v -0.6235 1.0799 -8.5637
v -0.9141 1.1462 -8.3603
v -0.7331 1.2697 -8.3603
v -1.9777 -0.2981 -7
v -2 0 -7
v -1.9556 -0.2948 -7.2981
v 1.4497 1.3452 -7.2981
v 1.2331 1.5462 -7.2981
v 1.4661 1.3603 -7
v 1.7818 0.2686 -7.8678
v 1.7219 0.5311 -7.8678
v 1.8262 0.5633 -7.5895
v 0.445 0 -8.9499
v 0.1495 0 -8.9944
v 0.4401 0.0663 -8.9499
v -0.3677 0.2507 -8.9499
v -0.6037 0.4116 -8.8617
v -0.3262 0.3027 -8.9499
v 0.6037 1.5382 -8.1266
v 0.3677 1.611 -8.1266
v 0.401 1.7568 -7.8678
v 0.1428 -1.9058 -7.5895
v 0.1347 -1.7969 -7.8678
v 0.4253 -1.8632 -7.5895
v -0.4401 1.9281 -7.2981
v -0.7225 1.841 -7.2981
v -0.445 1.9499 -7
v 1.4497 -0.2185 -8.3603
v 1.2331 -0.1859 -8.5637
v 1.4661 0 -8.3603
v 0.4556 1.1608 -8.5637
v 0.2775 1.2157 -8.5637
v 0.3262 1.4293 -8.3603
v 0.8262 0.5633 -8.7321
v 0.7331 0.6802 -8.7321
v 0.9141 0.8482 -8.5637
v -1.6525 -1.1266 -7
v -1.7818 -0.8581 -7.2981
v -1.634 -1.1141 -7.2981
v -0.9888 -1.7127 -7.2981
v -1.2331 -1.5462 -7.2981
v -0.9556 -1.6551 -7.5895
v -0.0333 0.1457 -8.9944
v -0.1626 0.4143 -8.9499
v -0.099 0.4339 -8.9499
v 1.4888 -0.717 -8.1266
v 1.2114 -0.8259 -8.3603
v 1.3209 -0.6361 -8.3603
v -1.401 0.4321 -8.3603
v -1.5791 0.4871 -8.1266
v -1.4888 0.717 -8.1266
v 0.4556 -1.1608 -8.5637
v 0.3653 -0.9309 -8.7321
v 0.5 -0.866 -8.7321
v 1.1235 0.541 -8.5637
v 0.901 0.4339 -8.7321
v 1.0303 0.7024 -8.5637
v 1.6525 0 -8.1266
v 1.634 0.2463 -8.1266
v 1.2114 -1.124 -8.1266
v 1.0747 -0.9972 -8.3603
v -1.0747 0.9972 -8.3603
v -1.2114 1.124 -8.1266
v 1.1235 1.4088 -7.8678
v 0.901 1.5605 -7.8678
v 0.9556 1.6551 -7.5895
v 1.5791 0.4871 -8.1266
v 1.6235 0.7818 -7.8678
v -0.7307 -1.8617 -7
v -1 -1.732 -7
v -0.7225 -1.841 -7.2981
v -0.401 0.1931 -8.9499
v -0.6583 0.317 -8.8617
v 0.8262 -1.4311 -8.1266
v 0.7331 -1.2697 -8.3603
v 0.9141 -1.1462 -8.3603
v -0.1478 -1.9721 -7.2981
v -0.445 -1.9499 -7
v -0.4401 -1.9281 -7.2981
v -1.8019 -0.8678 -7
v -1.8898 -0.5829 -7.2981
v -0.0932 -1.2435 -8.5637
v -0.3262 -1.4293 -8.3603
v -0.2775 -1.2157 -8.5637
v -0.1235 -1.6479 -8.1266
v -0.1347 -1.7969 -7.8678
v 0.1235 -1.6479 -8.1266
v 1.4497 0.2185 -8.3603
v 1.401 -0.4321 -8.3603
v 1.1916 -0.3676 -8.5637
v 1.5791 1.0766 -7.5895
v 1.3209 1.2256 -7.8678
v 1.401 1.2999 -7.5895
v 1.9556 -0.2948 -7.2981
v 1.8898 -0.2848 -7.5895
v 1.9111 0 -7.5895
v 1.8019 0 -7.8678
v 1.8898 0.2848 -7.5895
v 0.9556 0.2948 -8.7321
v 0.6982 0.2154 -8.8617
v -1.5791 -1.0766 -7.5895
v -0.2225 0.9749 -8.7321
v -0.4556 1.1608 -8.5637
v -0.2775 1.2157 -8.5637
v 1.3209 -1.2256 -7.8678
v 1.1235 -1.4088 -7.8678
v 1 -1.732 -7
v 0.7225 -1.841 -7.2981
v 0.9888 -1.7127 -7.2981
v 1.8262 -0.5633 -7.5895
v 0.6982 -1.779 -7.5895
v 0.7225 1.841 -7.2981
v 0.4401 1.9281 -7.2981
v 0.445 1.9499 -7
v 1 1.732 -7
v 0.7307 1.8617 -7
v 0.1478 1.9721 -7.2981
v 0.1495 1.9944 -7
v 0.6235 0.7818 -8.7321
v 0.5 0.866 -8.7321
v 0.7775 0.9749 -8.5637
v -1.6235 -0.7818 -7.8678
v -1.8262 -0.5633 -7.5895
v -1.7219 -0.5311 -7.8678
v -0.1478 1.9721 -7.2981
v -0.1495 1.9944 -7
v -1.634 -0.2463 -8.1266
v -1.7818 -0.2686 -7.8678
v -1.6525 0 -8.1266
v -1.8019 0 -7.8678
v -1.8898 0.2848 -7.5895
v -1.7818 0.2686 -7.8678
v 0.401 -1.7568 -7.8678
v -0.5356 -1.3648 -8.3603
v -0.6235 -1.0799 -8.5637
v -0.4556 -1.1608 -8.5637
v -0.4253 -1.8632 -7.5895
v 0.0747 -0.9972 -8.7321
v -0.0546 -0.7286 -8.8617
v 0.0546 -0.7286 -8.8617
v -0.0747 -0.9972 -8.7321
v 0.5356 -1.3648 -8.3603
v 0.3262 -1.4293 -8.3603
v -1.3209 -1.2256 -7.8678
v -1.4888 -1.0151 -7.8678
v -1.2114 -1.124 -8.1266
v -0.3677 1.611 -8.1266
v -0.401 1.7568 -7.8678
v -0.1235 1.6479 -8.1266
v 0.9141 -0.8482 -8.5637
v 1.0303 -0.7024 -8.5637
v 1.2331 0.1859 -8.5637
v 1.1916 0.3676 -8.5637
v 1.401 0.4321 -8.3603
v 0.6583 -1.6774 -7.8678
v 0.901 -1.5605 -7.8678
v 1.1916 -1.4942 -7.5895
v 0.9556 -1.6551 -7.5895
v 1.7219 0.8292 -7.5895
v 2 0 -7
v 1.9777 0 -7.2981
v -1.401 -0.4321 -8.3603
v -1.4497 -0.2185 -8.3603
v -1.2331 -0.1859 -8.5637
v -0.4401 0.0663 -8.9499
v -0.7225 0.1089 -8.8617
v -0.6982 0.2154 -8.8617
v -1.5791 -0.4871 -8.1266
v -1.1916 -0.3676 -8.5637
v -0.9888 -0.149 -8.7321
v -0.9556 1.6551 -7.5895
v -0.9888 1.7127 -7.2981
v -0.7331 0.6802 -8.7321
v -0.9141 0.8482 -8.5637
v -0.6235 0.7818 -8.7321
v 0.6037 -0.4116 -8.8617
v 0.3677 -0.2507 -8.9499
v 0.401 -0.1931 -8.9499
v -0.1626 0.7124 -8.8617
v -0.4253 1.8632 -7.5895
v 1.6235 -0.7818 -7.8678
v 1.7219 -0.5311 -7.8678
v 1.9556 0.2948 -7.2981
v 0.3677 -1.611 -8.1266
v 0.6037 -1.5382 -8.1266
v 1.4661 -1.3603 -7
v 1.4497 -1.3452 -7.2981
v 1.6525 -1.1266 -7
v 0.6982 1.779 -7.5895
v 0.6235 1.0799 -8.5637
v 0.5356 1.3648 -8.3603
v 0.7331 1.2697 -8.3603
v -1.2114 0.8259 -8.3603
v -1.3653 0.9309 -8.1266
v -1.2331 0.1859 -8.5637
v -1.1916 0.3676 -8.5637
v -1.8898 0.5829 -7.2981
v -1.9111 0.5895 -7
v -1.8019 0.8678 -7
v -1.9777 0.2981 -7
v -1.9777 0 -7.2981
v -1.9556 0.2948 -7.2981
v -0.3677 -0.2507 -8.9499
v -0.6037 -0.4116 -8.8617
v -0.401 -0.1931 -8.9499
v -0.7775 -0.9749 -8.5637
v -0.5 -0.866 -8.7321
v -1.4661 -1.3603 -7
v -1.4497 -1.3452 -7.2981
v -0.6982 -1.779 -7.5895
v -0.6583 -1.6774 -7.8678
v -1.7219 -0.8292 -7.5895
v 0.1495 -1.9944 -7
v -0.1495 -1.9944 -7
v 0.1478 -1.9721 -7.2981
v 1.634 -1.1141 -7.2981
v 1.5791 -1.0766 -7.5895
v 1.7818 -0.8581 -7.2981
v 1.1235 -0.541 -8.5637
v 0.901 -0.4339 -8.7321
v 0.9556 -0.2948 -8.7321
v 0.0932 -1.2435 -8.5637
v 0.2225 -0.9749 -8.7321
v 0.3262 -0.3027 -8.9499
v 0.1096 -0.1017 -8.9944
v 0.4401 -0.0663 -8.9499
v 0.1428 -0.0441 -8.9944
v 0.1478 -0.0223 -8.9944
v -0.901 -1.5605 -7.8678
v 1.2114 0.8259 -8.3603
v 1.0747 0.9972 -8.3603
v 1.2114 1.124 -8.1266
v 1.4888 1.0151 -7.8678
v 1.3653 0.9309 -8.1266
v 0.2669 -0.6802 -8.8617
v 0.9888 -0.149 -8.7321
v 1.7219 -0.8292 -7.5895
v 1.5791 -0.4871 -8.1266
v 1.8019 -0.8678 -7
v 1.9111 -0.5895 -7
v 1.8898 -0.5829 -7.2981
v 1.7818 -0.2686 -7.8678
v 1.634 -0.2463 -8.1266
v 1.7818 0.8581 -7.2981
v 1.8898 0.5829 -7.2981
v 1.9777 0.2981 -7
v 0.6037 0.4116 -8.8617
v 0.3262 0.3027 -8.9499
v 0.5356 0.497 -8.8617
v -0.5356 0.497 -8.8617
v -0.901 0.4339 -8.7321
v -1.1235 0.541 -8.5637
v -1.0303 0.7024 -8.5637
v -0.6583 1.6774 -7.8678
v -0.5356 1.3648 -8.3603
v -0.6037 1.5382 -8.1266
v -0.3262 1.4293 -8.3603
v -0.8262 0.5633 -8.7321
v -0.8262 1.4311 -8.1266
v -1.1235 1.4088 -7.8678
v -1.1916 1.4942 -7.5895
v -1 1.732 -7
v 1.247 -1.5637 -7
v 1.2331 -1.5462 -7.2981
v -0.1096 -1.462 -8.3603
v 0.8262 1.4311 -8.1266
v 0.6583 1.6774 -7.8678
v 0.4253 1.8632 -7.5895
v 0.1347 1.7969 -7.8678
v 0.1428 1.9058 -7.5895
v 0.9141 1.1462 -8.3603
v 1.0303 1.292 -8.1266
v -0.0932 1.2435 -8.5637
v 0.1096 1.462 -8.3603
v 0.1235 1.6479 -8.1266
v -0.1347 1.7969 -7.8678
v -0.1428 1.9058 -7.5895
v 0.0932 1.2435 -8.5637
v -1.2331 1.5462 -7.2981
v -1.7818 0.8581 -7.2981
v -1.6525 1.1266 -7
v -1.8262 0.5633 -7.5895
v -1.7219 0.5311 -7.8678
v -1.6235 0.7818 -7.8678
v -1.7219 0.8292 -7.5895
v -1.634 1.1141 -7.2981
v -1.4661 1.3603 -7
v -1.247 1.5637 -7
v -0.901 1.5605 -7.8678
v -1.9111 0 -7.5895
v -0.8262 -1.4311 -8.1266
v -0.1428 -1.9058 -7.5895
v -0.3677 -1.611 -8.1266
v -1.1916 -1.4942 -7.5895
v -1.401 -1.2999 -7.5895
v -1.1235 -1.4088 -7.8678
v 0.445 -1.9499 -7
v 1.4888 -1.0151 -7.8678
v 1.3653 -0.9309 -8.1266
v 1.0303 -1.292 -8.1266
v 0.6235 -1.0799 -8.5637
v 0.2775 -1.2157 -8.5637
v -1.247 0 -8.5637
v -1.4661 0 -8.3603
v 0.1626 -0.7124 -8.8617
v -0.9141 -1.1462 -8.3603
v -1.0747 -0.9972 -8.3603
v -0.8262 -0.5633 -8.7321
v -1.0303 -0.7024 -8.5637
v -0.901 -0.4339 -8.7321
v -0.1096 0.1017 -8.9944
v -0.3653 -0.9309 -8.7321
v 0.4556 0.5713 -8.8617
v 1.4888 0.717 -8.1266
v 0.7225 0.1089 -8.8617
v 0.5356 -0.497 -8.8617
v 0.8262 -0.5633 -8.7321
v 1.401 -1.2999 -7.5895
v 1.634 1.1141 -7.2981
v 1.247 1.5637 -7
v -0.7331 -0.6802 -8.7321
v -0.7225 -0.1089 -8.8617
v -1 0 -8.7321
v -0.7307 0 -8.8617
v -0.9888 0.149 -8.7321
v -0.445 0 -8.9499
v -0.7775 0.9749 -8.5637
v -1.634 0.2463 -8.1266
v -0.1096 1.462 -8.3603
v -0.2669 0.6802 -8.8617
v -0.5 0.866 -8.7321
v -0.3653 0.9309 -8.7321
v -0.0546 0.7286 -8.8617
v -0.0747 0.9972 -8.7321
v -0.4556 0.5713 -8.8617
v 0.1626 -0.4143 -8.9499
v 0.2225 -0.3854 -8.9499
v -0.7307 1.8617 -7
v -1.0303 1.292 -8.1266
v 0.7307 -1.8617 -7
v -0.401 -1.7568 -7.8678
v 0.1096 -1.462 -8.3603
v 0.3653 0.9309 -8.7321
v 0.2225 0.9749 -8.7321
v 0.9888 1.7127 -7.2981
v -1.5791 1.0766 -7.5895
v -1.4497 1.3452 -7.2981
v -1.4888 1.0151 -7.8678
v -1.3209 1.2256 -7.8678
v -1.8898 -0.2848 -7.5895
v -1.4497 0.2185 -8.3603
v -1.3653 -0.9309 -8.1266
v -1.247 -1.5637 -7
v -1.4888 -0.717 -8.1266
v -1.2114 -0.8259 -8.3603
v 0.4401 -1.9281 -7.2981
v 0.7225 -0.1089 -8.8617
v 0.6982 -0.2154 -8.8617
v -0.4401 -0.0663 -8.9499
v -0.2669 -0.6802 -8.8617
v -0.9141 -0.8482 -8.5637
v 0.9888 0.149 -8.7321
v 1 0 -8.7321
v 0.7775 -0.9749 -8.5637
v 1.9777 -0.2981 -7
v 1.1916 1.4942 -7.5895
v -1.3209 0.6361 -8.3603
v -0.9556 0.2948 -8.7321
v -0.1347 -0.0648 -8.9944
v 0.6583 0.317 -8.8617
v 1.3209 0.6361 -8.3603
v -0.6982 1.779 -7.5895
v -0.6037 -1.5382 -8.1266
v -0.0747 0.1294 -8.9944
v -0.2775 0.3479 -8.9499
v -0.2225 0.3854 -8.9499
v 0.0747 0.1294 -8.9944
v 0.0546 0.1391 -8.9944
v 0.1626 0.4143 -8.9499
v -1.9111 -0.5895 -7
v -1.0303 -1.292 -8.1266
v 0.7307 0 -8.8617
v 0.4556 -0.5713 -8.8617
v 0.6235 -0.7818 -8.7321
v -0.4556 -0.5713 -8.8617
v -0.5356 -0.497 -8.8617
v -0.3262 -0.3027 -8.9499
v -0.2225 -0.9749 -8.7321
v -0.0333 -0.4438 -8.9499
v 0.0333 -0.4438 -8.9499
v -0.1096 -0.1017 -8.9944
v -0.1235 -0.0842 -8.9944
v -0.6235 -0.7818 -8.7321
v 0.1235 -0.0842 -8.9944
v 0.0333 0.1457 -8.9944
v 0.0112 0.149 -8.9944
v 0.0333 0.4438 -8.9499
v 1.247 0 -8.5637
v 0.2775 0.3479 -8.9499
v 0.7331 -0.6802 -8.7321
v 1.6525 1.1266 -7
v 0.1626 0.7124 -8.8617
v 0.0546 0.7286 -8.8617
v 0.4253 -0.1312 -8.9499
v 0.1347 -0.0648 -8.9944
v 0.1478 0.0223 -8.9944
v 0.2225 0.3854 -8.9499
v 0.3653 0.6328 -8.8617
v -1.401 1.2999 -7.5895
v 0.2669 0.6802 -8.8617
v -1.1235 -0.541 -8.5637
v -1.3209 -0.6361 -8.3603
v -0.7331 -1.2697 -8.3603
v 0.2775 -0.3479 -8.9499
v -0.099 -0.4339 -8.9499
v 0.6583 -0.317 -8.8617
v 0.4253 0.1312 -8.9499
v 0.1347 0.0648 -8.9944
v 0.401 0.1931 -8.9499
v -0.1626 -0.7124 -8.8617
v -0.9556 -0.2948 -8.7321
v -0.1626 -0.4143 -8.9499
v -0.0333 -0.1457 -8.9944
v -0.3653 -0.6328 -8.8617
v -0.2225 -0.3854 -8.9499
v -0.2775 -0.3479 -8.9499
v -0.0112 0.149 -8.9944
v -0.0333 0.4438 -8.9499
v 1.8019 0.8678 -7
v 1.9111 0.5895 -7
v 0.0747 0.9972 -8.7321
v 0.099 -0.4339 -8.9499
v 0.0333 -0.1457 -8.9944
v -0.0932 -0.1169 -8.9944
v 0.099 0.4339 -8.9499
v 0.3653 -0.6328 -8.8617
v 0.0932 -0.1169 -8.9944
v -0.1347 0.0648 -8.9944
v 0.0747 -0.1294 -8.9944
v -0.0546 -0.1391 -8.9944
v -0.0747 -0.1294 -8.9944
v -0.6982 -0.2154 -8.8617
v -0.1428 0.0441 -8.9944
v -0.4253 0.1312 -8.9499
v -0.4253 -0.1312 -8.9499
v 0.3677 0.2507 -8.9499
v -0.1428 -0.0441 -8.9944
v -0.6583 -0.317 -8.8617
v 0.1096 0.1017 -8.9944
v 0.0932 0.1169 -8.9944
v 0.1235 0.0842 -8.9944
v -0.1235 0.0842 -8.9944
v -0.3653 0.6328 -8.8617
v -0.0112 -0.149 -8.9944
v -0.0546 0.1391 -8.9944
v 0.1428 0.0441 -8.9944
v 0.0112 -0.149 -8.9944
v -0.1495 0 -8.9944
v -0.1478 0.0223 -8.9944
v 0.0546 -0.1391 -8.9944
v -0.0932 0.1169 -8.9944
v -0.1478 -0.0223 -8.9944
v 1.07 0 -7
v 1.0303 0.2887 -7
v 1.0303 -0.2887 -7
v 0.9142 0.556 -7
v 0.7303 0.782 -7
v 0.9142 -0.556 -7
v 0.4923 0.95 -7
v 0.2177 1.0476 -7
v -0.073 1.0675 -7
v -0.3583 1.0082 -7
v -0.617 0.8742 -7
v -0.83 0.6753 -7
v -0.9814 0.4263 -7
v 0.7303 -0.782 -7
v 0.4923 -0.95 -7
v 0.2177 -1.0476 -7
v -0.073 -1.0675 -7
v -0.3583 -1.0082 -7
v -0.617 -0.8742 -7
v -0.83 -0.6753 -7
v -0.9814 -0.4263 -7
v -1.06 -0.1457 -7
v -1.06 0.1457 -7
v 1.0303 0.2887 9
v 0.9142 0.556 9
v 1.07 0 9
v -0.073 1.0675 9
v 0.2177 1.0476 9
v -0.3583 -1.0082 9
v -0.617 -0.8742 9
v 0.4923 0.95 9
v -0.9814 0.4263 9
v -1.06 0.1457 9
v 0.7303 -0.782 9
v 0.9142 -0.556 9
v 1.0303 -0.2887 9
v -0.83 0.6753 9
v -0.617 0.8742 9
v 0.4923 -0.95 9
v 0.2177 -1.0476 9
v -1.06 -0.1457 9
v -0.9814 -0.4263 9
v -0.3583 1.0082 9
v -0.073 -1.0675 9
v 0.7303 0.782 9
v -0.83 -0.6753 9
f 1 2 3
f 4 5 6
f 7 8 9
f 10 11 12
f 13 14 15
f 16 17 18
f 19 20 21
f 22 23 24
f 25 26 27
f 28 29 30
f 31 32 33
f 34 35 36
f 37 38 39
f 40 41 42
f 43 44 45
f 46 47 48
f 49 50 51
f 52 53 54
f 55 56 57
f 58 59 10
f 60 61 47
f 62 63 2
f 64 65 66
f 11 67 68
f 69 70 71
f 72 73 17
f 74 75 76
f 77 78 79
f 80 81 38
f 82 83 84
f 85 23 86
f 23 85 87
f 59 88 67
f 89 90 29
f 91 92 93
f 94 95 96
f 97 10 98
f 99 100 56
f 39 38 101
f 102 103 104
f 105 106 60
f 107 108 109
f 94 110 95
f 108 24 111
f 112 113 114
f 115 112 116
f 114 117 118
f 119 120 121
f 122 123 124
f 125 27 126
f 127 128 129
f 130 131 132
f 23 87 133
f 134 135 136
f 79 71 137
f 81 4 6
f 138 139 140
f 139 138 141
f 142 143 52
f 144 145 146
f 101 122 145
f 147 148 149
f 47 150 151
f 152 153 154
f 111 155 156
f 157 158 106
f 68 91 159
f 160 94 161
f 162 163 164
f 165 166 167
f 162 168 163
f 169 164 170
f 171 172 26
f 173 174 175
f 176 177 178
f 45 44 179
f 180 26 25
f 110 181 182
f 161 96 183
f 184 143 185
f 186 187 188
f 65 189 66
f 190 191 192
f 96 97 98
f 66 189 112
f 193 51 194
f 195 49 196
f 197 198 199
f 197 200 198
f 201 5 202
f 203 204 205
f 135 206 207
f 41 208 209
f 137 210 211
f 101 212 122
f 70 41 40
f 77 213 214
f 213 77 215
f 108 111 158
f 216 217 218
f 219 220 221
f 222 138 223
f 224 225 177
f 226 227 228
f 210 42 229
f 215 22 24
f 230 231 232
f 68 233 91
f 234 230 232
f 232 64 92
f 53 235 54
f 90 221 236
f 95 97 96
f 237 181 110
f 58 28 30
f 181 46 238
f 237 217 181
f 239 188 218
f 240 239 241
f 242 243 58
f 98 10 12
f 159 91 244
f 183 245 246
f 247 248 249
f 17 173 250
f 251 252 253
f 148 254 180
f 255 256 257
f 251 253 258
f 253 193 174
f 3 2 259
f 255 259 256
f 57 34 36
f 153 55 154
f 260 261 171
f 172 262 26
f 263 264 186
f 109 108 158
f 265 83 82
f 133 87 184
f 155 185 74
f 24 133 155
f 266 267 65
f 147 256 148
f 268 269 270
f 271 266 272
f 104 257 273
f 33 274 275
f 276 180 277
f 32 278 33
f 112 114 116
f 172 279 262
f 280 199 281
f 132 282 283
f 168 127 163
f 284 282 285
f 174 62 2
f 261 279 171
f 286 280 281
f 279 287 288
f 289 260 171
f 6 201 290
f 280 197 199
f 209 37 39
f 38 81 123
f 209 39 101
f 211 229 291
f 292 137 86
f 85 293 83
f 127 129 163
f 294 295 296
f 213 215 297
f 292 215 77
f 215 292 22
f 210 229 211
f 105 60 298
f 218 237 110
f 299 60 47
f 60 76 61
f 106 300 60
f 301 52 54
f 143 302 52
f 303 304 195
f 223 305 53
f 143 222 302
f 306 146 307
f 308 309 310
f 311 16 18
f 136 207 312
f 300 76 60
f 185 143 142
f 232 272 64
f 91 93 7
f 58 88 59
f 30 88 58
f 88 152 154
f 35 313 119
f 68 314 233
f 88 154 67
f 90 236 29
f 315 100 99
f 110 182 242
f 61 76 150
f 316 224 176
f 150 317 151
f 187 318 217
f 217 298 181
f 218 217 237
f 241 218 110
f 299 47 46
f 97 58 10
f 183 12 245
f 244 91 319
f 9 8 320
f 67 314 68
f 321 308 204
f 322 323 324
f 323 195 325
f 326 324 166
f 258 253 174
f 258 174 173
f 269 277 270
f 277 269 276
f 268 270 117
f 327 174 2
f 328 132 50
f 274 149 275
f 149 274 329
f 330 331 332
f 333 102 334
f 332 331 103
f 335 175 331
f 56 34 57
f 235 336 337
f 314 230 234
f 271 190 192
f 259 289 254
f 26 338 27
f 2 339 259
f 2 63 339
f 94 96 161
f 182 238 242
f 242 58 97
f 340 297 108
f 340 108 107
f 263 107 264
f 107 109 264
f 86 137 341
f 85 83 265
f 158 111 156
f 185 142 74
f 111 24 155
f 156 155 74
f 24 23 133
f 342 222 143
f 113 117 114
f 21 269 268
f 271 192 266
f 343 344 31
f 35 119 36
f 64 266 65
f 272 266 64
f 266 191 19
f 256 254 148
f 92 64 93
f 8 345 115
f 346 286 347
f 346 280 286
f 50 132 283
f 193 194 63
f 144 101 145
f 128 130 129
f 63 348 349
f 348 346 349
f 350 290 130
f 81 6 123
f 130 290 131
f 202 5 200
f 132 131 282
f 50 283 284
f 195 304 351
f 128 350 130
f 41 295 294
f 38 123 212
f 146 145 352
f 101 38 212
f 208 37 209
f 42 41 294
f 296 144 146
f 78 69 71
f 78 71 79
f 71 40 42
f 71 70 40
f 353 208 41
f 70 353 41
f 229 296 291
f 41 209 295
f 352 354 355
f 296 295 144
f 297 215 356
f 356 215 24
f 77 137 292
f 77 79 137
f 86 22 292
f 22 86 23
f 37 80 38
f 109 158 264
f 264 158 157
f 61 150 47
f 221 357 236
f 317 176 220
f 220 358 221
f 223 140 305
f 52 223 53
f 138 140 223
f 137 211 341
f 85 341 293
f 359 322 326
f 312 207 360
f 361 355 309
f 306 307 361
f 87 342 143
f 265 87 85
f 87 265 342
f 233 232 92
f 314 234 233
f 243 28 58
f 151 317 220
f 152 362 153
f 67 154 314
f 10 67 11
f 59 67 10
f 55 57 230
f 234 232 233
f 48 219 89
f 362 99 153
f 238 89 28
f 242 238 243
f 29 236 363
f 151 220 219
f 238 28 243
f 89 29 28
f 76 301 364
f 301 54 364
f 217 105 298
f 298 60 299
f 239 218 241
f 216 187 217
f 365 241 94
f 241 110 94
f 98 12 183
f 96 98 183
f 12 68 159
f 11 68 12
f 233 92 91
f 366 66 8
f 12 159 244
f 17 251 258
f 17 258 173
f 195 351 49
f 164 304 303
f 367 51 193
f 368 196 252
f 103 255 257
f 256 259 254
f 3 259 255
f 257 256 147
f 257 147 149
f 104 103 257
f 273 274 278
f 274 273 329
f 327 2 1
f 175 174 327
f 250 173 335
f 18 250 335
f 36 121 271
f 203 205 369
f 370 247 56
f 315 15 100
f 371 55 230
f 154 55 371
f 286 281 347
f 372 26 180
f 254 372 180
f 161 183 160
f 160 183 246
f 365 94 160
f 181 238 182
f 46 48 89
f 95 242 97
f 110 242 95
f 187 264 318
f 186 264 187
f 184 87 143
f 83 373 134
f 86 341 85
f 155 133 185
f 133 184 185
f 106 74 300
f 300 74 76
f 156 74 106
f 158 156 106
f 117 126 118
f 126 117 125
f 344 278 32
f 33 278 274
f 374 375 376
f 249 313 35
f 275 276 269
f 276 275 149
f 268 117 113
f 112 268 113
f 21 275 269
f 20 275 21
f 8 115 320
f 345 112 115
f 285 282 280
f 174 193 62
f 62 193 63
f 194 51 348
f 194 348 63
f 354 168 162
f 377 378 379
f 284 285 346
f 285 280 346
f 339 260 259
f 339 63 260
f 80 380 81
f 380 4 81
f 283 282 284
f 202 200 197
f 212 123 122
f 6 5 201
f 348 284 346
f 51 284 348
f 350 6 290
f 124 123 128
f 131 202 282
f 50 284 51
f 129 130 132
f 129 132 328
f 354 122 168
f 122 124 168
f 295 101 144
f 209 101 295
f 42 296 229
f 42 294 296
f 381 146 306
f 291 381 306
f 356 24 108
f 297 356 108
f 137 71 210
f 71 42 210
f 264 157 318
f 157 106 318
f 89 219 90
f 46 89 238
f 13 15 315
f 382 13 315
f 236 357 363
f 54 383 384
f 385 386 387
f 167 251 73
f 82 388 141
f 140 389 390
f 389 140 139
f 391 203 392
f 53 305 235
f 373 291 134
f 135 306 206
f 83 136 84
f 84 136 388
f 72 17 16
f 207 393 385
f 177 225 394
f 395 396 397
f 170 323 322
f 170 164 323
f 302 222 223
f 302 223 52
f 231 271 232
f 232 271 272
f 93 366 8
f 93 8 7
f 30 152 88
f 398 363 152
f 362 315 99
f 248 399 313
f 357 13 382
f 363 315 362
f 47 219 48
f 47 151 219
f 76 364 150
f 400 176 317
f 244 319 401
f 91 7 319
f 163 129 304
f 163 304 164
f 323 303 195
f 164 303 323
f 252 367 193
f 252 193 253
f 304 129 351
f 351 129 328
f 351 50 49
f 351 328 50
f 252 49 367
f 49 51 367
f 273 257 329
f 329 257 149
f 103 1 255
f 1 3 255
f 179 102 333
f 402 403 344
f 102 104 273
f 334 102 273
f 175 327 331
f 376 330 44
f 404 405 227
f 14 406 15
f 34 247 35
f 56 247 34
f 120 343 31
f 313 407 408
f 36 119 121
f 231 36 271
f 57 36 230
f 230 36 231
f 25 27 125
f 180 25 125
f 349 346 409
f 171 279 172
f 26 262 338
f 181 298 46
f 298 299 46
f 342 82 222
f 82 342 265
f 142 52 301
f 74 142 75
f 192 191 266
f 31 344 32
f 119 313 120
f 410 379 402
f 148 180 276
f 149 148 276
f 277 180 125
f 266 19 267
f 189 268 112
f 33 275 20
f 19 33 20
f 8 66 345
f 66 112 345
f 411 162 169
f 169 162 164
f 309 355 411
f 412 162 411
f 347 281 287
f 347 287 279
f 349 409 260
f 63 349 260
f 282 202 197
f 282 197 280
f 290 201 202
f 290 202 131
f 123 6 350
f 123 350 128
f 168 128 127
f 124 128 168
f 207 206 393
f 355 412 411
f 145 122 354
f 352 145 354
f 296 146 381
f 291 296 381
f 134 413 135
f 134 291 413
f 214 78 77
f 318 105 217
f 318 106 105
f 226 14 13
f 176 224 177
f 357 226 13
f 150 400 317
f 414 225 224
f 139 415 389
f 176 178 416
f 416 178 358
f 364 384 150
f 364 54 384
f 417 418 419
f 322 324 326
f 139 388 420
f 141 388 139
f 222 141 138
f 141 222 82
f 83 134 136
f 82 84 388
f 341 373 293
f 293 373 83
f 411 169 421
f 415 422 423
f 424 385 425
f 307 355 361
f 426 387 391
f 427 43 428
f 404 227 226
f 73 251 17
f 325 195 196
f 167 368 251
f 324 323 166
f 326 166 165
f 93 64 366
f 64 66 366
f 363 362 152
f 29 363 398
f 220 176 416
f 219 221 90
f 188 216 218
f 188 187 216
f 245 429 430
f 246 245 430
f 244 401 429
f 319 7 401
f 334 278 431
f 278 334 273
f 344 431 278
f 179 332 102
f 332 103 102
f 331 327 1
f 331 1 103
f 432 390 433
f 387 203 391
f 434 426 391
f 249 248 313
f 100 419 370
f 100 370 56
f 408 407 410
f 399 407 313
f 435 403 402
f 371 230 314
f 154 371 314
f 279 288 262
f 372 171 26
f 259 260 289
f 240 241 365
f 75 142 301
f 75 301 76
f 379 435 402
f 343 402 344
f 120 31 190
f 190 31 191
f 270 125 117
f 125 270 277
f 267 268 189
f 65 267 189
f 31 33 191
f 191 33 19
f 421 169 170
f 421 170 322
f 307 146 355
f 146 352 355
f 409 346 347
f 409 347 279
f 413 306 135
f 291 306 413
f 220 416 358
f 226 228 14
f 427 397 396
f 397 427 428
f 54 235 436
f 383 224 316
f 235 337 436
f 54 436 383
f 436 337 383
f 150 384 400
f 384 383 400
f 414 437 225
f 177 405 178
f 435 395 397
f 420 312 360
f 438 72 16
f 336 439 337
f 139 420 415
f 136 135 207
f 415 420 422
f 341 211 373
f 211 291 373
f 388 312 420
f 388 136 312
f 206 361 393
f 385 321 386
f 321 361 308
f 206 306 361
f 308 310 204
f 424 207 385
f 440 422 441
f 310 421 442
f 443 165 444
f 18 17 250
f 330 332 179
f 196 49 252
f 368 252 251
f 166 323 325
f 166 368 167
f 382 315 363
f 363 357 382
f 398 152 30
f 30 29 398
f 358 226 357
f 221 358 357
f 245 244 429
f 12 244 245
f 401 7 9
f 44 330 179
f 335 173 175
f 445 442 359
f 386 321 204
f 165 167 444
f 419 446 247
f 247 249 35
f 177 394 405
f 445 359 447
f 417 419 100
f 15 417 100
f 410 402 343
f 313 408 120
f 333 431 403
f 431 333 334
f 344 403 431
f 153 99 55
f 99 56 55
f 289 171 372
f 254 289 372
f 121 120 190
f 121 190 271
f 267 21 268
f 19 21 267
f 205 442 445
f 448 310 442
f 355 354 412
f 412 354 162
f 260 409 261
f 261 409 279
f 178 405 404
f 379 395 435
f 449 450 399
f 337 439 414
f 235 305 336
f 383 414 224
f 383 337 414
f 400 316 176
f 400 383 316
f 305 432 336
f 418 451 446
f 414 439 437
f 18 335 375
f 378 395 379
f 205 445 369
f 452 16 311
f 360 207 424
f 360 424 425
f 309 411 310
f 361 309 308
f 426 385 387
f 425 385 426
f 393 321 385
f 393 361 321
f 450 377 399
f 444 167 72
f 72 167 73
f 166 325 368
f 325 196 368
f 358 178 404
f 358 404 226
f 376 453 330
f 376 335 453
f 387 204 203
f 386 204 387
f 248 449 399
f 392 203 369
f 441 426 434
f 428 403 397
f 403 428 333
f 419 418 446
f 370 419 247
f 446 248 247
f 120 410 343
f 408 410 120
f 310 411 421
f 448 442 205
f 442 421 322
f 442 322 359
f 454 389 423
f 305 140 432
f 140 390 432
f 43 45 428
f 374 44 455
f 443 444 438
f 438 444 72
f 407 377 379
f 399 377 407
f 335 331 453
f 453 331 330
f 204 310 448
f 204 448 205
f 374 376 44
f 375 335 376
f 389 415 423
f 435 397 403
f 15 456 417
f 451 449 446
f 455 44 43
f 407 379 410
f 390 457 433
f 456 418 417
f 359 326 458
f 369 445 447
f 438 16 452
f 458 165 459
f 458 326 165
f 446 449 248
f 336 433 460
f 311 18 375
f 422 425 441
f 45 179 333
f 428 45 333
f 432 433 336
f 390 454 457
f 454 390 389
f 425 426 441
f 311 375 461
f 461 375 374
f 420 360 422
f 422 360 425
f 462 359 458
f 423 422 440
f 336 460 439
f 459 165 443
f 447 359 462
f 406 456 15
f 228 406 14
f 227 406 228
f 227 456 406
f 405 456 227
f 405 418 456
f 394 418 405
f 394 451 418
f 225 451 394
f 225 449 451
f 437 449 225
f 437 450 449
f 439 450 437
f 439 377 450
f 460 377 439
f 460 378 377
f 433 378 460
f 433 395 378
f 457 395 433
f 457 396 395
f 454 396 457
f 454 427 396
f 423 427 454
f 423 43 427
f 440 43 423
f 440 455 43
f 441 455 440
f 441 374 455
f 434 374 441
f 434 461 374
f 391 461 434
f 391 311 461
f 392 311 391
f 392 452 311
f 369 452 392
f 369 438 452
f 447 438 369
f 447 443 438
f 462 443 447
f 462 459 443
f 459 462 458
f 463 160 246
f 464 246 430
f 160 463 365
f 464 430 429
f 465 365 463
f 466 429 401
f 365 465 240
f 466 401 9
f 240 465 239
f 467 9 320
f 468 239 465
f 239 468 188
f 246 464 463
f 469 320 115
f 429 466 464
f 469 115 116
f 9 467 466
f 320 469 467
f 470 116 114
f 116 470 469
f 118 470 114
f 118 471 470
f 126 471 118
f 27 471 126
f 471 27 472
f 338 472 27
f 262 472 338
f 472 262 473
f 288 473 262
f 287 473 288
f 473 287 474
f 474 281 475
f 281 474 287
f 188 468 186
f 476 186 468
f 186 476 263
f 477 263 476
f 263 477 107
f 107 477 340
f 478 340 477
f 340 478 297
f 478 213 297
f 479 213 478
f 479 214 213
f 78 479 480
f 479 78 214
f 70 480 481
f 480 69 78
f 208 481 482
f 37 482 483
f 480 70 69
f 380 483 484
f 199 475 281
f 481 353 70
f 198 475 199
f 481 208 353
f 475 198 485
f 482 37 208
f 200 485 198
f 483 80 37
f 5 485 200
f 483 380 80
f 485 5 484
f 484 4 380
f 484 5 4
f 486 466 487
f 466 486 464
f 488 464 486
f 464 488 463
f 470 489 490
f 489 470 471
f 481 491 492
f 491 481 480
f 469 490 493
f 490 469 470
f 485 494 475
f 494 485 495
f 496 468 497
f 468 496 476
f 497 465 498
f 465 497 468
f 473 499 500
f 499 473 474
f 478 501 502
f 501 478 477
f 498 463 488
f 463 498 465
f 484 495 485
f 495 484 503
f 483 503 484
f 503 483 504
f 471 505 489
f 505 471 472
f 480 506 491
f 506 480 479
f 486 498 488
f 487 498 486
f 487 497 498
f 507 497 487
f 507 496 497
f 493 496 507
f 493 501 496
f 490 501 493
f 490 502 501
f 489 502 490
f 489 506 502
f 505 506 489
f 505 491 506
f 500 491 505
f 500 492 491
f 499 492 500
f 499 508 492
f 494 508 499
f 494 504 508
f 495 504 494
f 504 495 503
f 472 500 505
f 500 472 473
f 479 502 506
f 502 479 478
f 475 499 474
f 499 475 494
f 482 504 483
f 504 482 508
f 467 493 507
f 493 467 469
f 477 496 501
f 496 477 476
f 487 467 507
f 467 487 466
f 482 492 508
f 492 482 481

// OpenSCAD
// file: hexagon.scad
// -*-C-*-
// Model of a hexagon.
//
// Copyright 2013, Brian Davis
//
// License: LGPL 2.1 or later

// sine of 60 degrees
SIN_60=0.866025403784439;

// A 3D hexagon with height h and side length s.
//
// NOTE: the default values s=4, h=3 are for an M4 bolt.
//
// See http://www.rdwarf.com/lerickson/hex/
module hexagon(s=4, h=3) {
  A=0.5 * s;
  B=SIN_60 * s;
  C=s;

  translate([-s, -s * SIN_60, -h / 2])
    linear_extrude(height=h)
      polygon([[0, B], [A, 0],
	       [A + C, 0], [2 * C, B],
	       [A + C, 2 * B], [A, 2 * B]],
	      paths=[[0, 1, 2, 3, 4, 5]]);
}

// Test renders.
$fn=0;
$fa=0.01;
$fs=0.9;

hexagon();
// main file
// -*-C-*-
// Module for various types of bolts, screws, nuts, and washers.
//
// NOTE: the various _socket() objects are designed to be
// used with the difference() function to carve out sockets
// in other objects.
//
// Copyright 2013, Brian Davis
//
// License: LGPL 2.1 or later

use <hexagon.scad>

$fn=0;
$fa=0.01;
$fs=0.3;




// Generic support code.

/*
 * NOTE:
 * hs = head side (the length of one side of the hexagonal head)
 * hh = head height (the height/width of the hexagonal head)
 * sr = shaft radius
 * sh = shaft height
 */
module generic_bolt(hs, hh, sr, sh) {
  // Center the model.
  translate([0, 0, -sh / 2])
    union() {
      // head
      hexagon(s=hs, h=hh);
      // shaft
      // NOTE: add extra 0.1 to ensure proper connection
      // between shaft and head.
      translate([0, 0, (hh / 2) - 0.1])
        cylinder(r=sr, h=(sh + 0.1));
    }
}

/*
 * NOTE:
 * hr = head radius
 * hh = head height (the height/width of the hexagonal head)
 * sr = shaft radius
 * sh = shaft height
 * FIXME: philips head slots and some roundedness on the head
 * are not shown.
 */
module generic_machine_screw(hr, hh, sr, sh) {
  // Center the model.
  translate([0, 0, -sh / 2])
    union() {
      // head
      cylinder(r=hr, h=hh);
      // shaft
      // NOTE: add extra 0.1 to ensure proper connection
      // between shaft and head.
      translate([0, 0, (hh / 2) - 0.1])
        cylinder(r=sr, h=(sh + 0.1));
    }
}

/*
 * NOTE:
 * hr = head radius
 * hh = head height (the height/width of the conical head)
 * sr = shaft radius
 * sh = shaft height
 * FIXME: philips head slots and some roundedness on the head
 * are not shown.
 */
module generic_flat_head_machine_screw(hr, hh, sr, sh) {
  // Center the model.
  translate([0, 0, -sh / 2])
    union() {
      // head
    cylinder(r1=hr, r2=sr, h=hh);
      // shaft
      // NOTE: add extra 0.1 to ensure proper connection
      // between shaft and head.
      translate([0, 0, (hh / 2) - 0.1])
        cylinder(r=sr, h=(sh + 0.1));
    }
}

/*
 * NOTE:
 * hs = hexagon side (the length of one side of the outer hexagon)
 * hh = hexagon height
 * ir = inner radius (the radius of the inner hole)
 */
module generic_nut(hs, hh, ir) {
  difference() {
    hexagon(s=hs, h=hh);
    translate([0, 0, -(hh + 0.5) / 2])
      cylinder(r=ir, h=hh+0.5);
  }
}

/*
 * NOTE:
 * ir = inside radius
 * or = outside radius
 * t = thickness
 */
module generic_washer(ir, or, t) {
  difference() {
    cylinder(r=or, h=t, center=true);
    cylinder(r=ir, h=2 * t, center=true);
  }
}

/*
 * NOTE:
 * hr = head radius (the radius of the extra cutout for the head)
 * hh = head height
 * sr = shaft radius
 * sh = shaft height
 */
module generic_loose_socket(hr, hh, sr, sh) {
  // Center the model.
  translate([0, 0, -sh / 2])
    union() {
      // head
      cylinder(r=hr, h=hh, center=true);
      // shaft
      // NOTE: add extra 0.1 to ensure proper connection
      // between shaft and head.
      translate([0, 0, ((sh + hh) / 2) - 0.1])
        cylinder(r=sr, h=(sh + 0.1), center=true);
    };
}




// Fasteners using Metric units.

// M4

/*
 * A hex bolt with 4 mm diameter and variable length shaft with fixed
 * size, hexagonal head 3 mm in width and 4 mm on a side.
 */
module m4bolt(l=20) {
  color("gray")
  generic_bolt(hs=4, hh=3, sr=2, sh=l);
}

/*
 * A nut to fit M4 size bolts/screws.
 */
module m4nut() {
  color("gray")
  generic_nut(hs=4, hh=3, ir=2);
}

/*
 * A washer to fit M4 size bolts/screws.
 */
module m4washer() {
  color("gray")
  generic_washer(ir=2.15, or=6, t=1);
}

/*
 * A socket to tightly fit the head of the M4 size bolt,
 * with variable length.
 */
module m4bolt_socket_tight(l=20, ext=0) {
  generic_bolt(hs=4.25, hh=3.25 + ext, sr=2.25, sh=20);
}

/*
 * A socket to fit the head of the M4 size bolt with room
 * for the bolt to be tightened, with variable length.
 * NOTE:
 * er = the amount of extra radius around the head
 * eh = the amount of extra height for the space around the head
 */
module m4bolt_socket_loose(l=20, er=0, eh=0) {
  generic_loose_socket(hr=6 + er, hh=3.25 + eh, sr=2.2, sh=l);
}

/*
 * A socket to fit the M4 size nut.
 */
module m4nut_socket() {
  hexagon(s=4.25, h=3.25);
}


// M5

/*
 * A hex bolt with 5 mm diameter and variable length shaft with fixed
 * size, hexagonal head 3.6 mm in height/width and 5 mm on a side.
 */
module m5bolt(l=20) {
  color("gray")
  generic_bolt(hs=5, hh=3.6, sr=2.5, sh=l);
}

/*
 * A flat-head machine screw with 5mm diameter and variable length
 * shaft.
 * NOTE: Philips head slots not shown.
 */
module m5flat_head_machine_screw(l=20) {
  color("gray")
  generic_flat_head_machine_screw(hr=4.5, hh=3, sr=2.4, sh=l);
}

/*
 * A nut to fit M5 size bolts/screws.
 */
module m5nut() {
  color("gray")
  generic_nut(hs=5, hh=4, ir=2.5);
}

/*
 * A socket to tightly fit the head of the M5 size bolt,
 * with variable length.
 */
module m5bolt_socket_tight(l=20, ext=0) {
  generic_bolt(hs=5.25, hh=3.85 + ext, sr=2.75, sh=l);
}

/*
 * A socket to fit the head of the M5 size bolt with room
 * for the bolt to be tightened, with variable length.
 * er = the amount of extra radius around the head
 * eh = the amount of extra height for the space around the head
 */
module m5bolt_socket_loose(l=20, er=0, eh=0) {
  generic_loose_socket(hr=7 + er, hh=4.1 + eh, sr=3, sh=l);
}

/*
 * A socket to fit the M5 size nut.
 */
module m5nut_socket() {
  hexagon(s=5.25, h=3.85);
}

/*
 * A lock nut to fit M5 size bolts/screws.
 */
module m5locknut() {
  color("gray")
  union() {
    generic_nut(hs=5, hh=3, ir=2.125);
    translate([0, 0, 2])
      difference() {
        cylinder(r=3.75, h=1, center=true);
        cylinder(r=2.125, h=1.5, center=true);
      }
  }
}


// M6

/*
 * A flat-head machine screw with 6mm diameter and variable length
 * shaft.
 * NOTE: Philips head slots not shown.
 */
module m6flat_head_machine_screw(l=20) {
  color("gray")
  generic_flat_head_machine_screw(hr=5.5, hh=3, sr=2.9, sh=l);
}

/*
 * Standard-sized M6 x 20mm flat-head machine screw.
 * NOTE: the 20mm length includes the head.
 */
module m6x20mm_flat_head_machine_screw() {
  m6flat_head_machine_screw(l=17);
}

/*
 * Standard-sized M6 x 25mm flat-head machine screw.
 * NOTE: the 25mm length includes the head.
 */
module m6x25mm_flat_head_machine_screw() {
  m6flat_head_machine_screw(l=22);
}

/*
 * Standard-sized M6 x 35mm flat-head machine screw.
 * NOTE: the 35mm length includes the head.
 */
module m6x35mm_flat_head_machine_screw() {
  m6flat_head_machine_screw(l=32);
}

/*
 * A hex bolt with 5 mm diameter and variable length shaft with fixed
 * size, hexagonal head 3.6 mm in height/width and 5 mm on a side.
 */
module m6bolt(l=20) {
  color("gray")
  generic_bolt(hs=5.75, hh=4, sr=2.9, sh=l);
}

/*
 * Standard-sized M6 x 45mm hex bolt.
 * NOTE: the 45mm length does not include the head.
 */
module m6x45mm_hex_bolt() {
  m6bolt(l=45);
}

/*
 * A nut to fit M6 size bolts/screws.
 */
module m6nut() {
  color("gray")
  generic_nut(hs=5.5, hh=5, ir=2.9);
}

/*
 * A lock nut to fit M6 size bolts/screws.
 *
 * Modeled on Brighton-Best M6 1.00 DIN 985
 */
module m6locknut() {
  color("gray")
  union() {
    generic_nut(hs=5.5, hh=4, ir=2.9);
    translate([0, 0, 3])
      difference() {
        cylinder(r=5, h=2, center=true);
        cylinder(r=2.9, h=2.5, center=true);
      }
  }
}

/*
 * A washer to fit M6 size bolts/screws.
 */
module m6washer() {
  color("gray")
  generic_washer(ir=3.2, or=6.25, t=1.6);
}

/*
 * A socket to fit the M6 flat-head machine screw.
 */
module m6flat_head_machine_screw_socket(l=20) {
  generic_flat_head_machine_screw(hr=5.75, hh=3.5, sr=3.2, sh=l);
}

/*
 * A socket to fit the head of the M6 size bolt with room
 * for the bolt to be tightened, with variable length.
 * er = the amount of extra radius around the head
 * eh = the amount of extra height for the space around the head
 */
module m6bolt_socket_loose(l=20, er=0, eh=0) {
  generic_loose_socket(hr=7.5 + er, hh=4.1 + eh, sr=3.3, sh=l);
}



// Fasteners using Imperial units.

// TODO: still converting here

// 2-56 round-head screw and nut.

// A 2-56 round-head screw of specified length.
// NOTE: length INCLUDES the height of the screw head.
// Also, flat-head screwdriver slot not shown.
module 2_56_round_head_screw(l=18) {
  translate([0, 0, -l / 2])
    union() {
      // head
      difference() {
        // start with a sphere and then cut away the
        // lower portion
        translate([0, 0, 2])
          sphere(r=2);
        translate([-20, -20, 2])
          cube([40, 40, 40]);
      }
      // shaft
      translate([0, 0, 1.75])
        cylinder(r=1.07, h=(l-1.75));
    }
}

// A nut to fit the 2-56 size screw.
module 2_56_nut() {
  difference() {
    hexagon(s=2.7, h=1.55);
    // center hole
    translate([0, 0, -1.5])
      cylinder(r=1.05, h=3);
  }
}

// A socket to fit the 2-56 size nut.
//
// NOTE: extend parameter allows the depth of the cutout
// to be expanded.
module 2_56_nut_socket(l=18, extend=0) {
  translate([0, 0, -(l + 1.8 + extend) / 2])
    union() {
      translate([0, 0, l])
        hexagon(s=2.95, h=1.8 + extend);
      cylinder(r=1.35, h=l);
    }
}



// 4-40 round-head screw and nut.
// NOTE: 4-40 is a good size to use for securing
// Arduino boards to other objects.

// A 4-40 round-head screw of specified length.
// NOTE: length INCLUDES the height of the screw head.
// Also, flat-head screwdriver slot not shown.
// Default length of 21 mm is equivalent to a standard
// 1" length screw.
module 4_40_round_head_screw(l=21) {
  color("silver")
  translate([0, 0, -l / 2])
    union() {
      // head
      difference() {
        // start with a sphere and then cut away the
        // lower portion
        translate([0, 0, 2])
          sphere(r=2.5);
        translate([-20, -20, 2])
          cube([40, 40, 40]);
      }
      // shaft
      translate([0, 0, 2.2])
        cylinder(r=1.35, h=(l-2.2));
    }
}

// A nut to fit the 4-40 size screw.
module 4_40_nut() {
  color("silver")
  difference() {
    hexagon(s=3.5, h=2);
    // center hole
    translate([0, 0, -1.5])
      cylinder(r=1.2, h=3);
  }
}

// A socket to fit the 4-40 size nut.
//
// NOTE: extend parameter allows the depth of the cutout
// to be expanded.
module 4_40_nut_socket(l=18, extend=0) {
  translate([0, 0, -(l + 2.5 + extend) / 2])
    union() {
      translate([0, 0, l])
        hexagon(s=3.8, h=2.5 + extend);
      cylinder(r=1.7, h=l);
    }
}



// 6-32 round-head screw and nut.

// A 6-32 round-head screw of specified length.
// NOTE: length INCLUDES the height of the screw head.
// Also, flat-head screwdriver slot not shown.
module 6_32_round_head_screw(l=18) {
  color("silver")
  translate([0, 0, -l / 2])
    union() {
      // head
      difference() {
        // start with a sphere and then cut away the
        // lower portion
        translate([0, 0, 2])
          sphere(r=6.35/2);
        translate([-20, -20, 2])
	       cube([40, 40, 40]);
      }
      // shaft
      translate([0, 0, 2.2])
        cylinder(r=1.35, h=(l-2.2));
    }
}

// A nut to fit the 6-32 size screw.
module 6_32_nut() {
  color("silver")
  difference() {
    hexagon(s=3.6, h=2.3);
    // center hole
    translate([0, 0, -1.5])
      cylinder(r=3.4/2.0, h=3);
  }
}

// A socket to fit the 6-32 size nut.
//
// NOTE: extend parameter allows the depth of the cutout
// to be expanded.
module 6_32_nut_socket(l=18, extend=0) {
  translate([0, 0, -(l + 2.5 + extend) / 2])
    union() {
      translate([0, 0, l])
        hexagon(s=4, h=2.5 + extend);
      cylinder(r=1.9, h=l);
    }
}


// 10-32 round-head screw and nut.

// A 10-32 round-head screw of specified length.
// NOTE: length INCLUDES the height of the screw head.
// Also, flat-head screwdriver slot not shown.
module 10_32_round_head_screw(l=18) {
  color("silver")
  translate([0, 0, -l / 2])
    union() {
      // head
      difference() {
        // start with a sphere and then cut away the
        // lower portion
        translate([0, 0, 9])
          sphere(r=15/2);
        translate([-20, -20, 4.5])
	       cube([40, 40, 40]);
      }
      // shaft
      translate([0, 0, 4.25])
        cylinder(r=4.7/2.0, h=(l-4.25));
    }
}

// A nut to fit the 10-32 size screw.
module 10_32_nut() {
  color("silver")
  difference() {
    hexagon(s=5.5, h=3.15);
    // center hole
    translate([0, 0, -1.6])
      cylinder(r=4.9/2.0, h=4);
  }
}

// A socket to fit the 10-32 size nut.
//
// NOTE: extend parameter allows the depth of the cutout
// to be expanded.
module 10_32_nut_socket(l=18, extend=0) {
  translate([0, 0, -(l + 2.5 + extend) / 2])
    union() {
      translate([0, 0, l])
        hexagon(s=5.7, h=3.5 + extend);
      cylinder(r=2.7, h=l);
    }
}

// 10-24 round-head screw and nut.

// A 10-24 round-head screw of specified length.
// NOTE: length DOES NOT INCLUDE the height of the screw head.
// Also, flat-head screwdriver slot not shown.
module 10_24_machine_screw(l=20) {
  color("gray")
  generic_machine_screw(hr=4.5, hh=3.5, sr=2.25, sh=l);
}

// A nut to fit the 10-24 size screw.
module 10_24_nut() {
  color("gray")
  generic_nut(hs=4, hh=3.85, ir=2.05);
}

//// A socket to fit the 10-24 size nut.
////
//// NOTE: extend parameter allows the depth of the cutout
//// to be expanded.
//module 10_24_nut_socket(l=18, extend=0) {
//  translate([0, 0, -(l + 2.5 + extend) / 2])
//    union() {
//      translate([0, 0, l])
//        hexagon(s=5.7, h=3.5 + extend);
//      cylinder(r=2.7, h=l);
//    }
//}





// 1/4" bolt/nut/washer.

// A 1/4" bolt of specified length.
// NOTE: length INCLUDES the height of the bolt head.
module 1_4_inch_bolt(l=98) {
  color("silver")
  translate([0, 0, -l / 2])
    union() {
      // head
      hexagon(s=6.5, h=4);
      // shaft
      cylinder(h=l - 4, r=3.2);
    };
}

// A nut to fit the 1/4" size bolt.
module 1_4_inch_nut() {
  color("silver")
  difference() {
    hexagon(s=6.5, h=4);
    // center hole
    translate([0, 0, -1.6])
      cylinder(r=3.1, h=4);
  }
}

// A washer to fit the 1/4" size bolt.
module 1_4_inch_washer() {
  color("gray")
  difference() {
    cylinder(r=7.9, h=1.5, center=true);
    cylinder(r=3.65, h=1.75, center=true);
  }
}

// A socket to fit the 1/4" size nut.
//
// NOTE: extend parameter allows the depth of the cutout
// to be expanded.
module 1_4_inch_nut_socket(l=18, extend=0) {
  translate([0, 0, -(l + 2.5 + extend) / 2])
    union() {
      translate([0, 0, l])
        hexagon(s=6.7, h=5 + extend);
      cylinder(r=3.5, h=l);
    }
}

// A socket to fit the 1/4" size bolt with room for an
// appropriate washer and variable length.
// er = the amount of extra radius around the head
// eh = the amount of extra height for the space around the head
module 1_4_inch_bolt_socket_loose(l=20, er=0, eh=0) {
  // NOTE: using slightly larger default head radius than the
  // radius of the 3/8" washer.
  generic_loose_socket(hr=8.5 + er, hh=6.5 + eh, sr=3.5, sh=l);
}



// 3/8" bolt/nut/washer.

// A 3/8" bolt of specified length.
// NOTE: length DOES NOT INCLUDE the height of the bolt head.
module 3_8_inch_bolt(l=98) {
  color("gray")
  generic_bolt(hs=8, hh=5.4, sr=4.66, sh=l);
}

/*
 * Standard-sized 3/8" x 1/2" hex bolt.
 * NOTE: the 1/2" length does not include the head.
 */
module 3_8x1_2_inch_bolt() {
  color("gray")
  generic_bolt(hs=8, hh=5.4, sr=4.66, sh=12.5);
}

/*
 * Standard-sized 3/8" x 1 1/2" hex bolt.
 * NOTE: the 1 1/2" length does not include the head.
 */
module 3_8x1_and_1_2_inch_bolt() {
  color("gray")
  generic_bolt(hs=8, hh=5.4, sr=4.66, sh=37.5);
}

// A nut to fit the 3/8" size bolt.
module 3_8_inch_nut() {
  color("gray")
  generic_nut(hs=9.25, hh=7.8, ir=4.1);
}

// A washer to fit the 3/8" size bolt.
module 3_8_inch_washer() {
  color("gray")
  /* difference() { */
  /*   cylinder(r=11, h=1.5, center=true); */
  /*   cylinder(r=4.875, h=2.1, center=true); */
  /* } */
  generic_washer(ir=4.875, or=11, t=1.5);
}

// A socket to fit the 3/8" size bolt with room for an
// appropriate washer and variable length.
// er = the amount of extra radius around the head
// eh = the amount of extra height for the space around the head
module 3_8_inch_bolt_socket_loose(l=20, er=0, eh=0) {
  // NOTE: using slightly larger default head radius than the
  // radius of the 3/8" washer.
  generic_loose_socket(hr=(11.25 + er), hh=(9.5 + eh), sr=5, sh=l);
}



// 5/8" bolt/nut/washer.

// A nut to fit the 5/8" size bolt.
module 5_8_inch_nut() {
  color("gray")
  generic_nut(hs=14.5, hh=13.8, ir=6.825);
}

// A washer to fit the 5/8" size bolt.
module 5_8_inch_washer() {
  color("gray")
  generic_washer(ir=8.75, or=19.2, t=2);
}


// Test renders.

*m4bolt();
*m4bolt_socket_tight();
*m4bolt_socket_loose();
*m4nut();

*m5flat_head_machine_screw();

*m6flat_head_machine_screw();
*m6x35mm_flat_head_machine_screw();
*m6locknut();

2_56_round_head_screw();
*2_56_nut();
*2_56_nut_socket();
// This section is used for test printing of
// 2-56 nut sockets.
*translate([-14, 0, 0])
difference() {
  translate([-5, -5, 0])
    cube([10, 10, 5]);
  union() {
    translate([0, 0, 2.6])//5.01 - (1.8 / 2)])
      2_56_nut_socket(l=5);
  }
}


*4_40_round_head_screw();
*4_40_nut();
*%4_40_nut_socket();
// This section is used for test printing of
// 4-40 nut sockets.
*difference() {
  translate([-8, -8, 0])
    cube([16, 16, 8]);
  union() {
    translate([0, 0, 4.1])
      4_40_nut_socket(l=8);
  }
}


*6_32_round_head_screw();
*6_32_nut();
*%6_32_nut_socket();
// This section is used for test printing of
// 6-32 nut sockets.
*translate([17, 0, 0])
difference() {
  translate([-8, -8, 0])
    cube([16, 16, 8]);
  union() {
    translate([0, 0, 4.1])
      6_32_nut_socket(l=8);
  }
}


*10_32_round_head_screw();
*translate([0, 0, 3.5/2.0])
10_32_nut();
*%10_32_nut_socket();
// This section is used for test printing of
// 10-32 nut sockets.
*translate([17, 0, 0])
difference() {
  translate([-8.5, -8.5, 0])
    cube([17, 17, 8]);
  union() {
    translate([0, 0, 4.1])
      10_32_nut_socket(l=8);
  }
}

*%1_4_inch_bolt();
*%1_4_inch_nut_socket();
*1_4_inch_nut();
// This section is used for test printing of
// 1/4" nut sockets.
//translate([0, 0, 0])
*difference() {
  translate([0, 0, 0])
    cube([17, 17, 10]);
  union() {
    translate([8.5, 8.5, 5.01])
      1_4_inch_nut_socket(l=8);
  }
}

*5_8_inch_nut();

*5_8_inch_washer();
